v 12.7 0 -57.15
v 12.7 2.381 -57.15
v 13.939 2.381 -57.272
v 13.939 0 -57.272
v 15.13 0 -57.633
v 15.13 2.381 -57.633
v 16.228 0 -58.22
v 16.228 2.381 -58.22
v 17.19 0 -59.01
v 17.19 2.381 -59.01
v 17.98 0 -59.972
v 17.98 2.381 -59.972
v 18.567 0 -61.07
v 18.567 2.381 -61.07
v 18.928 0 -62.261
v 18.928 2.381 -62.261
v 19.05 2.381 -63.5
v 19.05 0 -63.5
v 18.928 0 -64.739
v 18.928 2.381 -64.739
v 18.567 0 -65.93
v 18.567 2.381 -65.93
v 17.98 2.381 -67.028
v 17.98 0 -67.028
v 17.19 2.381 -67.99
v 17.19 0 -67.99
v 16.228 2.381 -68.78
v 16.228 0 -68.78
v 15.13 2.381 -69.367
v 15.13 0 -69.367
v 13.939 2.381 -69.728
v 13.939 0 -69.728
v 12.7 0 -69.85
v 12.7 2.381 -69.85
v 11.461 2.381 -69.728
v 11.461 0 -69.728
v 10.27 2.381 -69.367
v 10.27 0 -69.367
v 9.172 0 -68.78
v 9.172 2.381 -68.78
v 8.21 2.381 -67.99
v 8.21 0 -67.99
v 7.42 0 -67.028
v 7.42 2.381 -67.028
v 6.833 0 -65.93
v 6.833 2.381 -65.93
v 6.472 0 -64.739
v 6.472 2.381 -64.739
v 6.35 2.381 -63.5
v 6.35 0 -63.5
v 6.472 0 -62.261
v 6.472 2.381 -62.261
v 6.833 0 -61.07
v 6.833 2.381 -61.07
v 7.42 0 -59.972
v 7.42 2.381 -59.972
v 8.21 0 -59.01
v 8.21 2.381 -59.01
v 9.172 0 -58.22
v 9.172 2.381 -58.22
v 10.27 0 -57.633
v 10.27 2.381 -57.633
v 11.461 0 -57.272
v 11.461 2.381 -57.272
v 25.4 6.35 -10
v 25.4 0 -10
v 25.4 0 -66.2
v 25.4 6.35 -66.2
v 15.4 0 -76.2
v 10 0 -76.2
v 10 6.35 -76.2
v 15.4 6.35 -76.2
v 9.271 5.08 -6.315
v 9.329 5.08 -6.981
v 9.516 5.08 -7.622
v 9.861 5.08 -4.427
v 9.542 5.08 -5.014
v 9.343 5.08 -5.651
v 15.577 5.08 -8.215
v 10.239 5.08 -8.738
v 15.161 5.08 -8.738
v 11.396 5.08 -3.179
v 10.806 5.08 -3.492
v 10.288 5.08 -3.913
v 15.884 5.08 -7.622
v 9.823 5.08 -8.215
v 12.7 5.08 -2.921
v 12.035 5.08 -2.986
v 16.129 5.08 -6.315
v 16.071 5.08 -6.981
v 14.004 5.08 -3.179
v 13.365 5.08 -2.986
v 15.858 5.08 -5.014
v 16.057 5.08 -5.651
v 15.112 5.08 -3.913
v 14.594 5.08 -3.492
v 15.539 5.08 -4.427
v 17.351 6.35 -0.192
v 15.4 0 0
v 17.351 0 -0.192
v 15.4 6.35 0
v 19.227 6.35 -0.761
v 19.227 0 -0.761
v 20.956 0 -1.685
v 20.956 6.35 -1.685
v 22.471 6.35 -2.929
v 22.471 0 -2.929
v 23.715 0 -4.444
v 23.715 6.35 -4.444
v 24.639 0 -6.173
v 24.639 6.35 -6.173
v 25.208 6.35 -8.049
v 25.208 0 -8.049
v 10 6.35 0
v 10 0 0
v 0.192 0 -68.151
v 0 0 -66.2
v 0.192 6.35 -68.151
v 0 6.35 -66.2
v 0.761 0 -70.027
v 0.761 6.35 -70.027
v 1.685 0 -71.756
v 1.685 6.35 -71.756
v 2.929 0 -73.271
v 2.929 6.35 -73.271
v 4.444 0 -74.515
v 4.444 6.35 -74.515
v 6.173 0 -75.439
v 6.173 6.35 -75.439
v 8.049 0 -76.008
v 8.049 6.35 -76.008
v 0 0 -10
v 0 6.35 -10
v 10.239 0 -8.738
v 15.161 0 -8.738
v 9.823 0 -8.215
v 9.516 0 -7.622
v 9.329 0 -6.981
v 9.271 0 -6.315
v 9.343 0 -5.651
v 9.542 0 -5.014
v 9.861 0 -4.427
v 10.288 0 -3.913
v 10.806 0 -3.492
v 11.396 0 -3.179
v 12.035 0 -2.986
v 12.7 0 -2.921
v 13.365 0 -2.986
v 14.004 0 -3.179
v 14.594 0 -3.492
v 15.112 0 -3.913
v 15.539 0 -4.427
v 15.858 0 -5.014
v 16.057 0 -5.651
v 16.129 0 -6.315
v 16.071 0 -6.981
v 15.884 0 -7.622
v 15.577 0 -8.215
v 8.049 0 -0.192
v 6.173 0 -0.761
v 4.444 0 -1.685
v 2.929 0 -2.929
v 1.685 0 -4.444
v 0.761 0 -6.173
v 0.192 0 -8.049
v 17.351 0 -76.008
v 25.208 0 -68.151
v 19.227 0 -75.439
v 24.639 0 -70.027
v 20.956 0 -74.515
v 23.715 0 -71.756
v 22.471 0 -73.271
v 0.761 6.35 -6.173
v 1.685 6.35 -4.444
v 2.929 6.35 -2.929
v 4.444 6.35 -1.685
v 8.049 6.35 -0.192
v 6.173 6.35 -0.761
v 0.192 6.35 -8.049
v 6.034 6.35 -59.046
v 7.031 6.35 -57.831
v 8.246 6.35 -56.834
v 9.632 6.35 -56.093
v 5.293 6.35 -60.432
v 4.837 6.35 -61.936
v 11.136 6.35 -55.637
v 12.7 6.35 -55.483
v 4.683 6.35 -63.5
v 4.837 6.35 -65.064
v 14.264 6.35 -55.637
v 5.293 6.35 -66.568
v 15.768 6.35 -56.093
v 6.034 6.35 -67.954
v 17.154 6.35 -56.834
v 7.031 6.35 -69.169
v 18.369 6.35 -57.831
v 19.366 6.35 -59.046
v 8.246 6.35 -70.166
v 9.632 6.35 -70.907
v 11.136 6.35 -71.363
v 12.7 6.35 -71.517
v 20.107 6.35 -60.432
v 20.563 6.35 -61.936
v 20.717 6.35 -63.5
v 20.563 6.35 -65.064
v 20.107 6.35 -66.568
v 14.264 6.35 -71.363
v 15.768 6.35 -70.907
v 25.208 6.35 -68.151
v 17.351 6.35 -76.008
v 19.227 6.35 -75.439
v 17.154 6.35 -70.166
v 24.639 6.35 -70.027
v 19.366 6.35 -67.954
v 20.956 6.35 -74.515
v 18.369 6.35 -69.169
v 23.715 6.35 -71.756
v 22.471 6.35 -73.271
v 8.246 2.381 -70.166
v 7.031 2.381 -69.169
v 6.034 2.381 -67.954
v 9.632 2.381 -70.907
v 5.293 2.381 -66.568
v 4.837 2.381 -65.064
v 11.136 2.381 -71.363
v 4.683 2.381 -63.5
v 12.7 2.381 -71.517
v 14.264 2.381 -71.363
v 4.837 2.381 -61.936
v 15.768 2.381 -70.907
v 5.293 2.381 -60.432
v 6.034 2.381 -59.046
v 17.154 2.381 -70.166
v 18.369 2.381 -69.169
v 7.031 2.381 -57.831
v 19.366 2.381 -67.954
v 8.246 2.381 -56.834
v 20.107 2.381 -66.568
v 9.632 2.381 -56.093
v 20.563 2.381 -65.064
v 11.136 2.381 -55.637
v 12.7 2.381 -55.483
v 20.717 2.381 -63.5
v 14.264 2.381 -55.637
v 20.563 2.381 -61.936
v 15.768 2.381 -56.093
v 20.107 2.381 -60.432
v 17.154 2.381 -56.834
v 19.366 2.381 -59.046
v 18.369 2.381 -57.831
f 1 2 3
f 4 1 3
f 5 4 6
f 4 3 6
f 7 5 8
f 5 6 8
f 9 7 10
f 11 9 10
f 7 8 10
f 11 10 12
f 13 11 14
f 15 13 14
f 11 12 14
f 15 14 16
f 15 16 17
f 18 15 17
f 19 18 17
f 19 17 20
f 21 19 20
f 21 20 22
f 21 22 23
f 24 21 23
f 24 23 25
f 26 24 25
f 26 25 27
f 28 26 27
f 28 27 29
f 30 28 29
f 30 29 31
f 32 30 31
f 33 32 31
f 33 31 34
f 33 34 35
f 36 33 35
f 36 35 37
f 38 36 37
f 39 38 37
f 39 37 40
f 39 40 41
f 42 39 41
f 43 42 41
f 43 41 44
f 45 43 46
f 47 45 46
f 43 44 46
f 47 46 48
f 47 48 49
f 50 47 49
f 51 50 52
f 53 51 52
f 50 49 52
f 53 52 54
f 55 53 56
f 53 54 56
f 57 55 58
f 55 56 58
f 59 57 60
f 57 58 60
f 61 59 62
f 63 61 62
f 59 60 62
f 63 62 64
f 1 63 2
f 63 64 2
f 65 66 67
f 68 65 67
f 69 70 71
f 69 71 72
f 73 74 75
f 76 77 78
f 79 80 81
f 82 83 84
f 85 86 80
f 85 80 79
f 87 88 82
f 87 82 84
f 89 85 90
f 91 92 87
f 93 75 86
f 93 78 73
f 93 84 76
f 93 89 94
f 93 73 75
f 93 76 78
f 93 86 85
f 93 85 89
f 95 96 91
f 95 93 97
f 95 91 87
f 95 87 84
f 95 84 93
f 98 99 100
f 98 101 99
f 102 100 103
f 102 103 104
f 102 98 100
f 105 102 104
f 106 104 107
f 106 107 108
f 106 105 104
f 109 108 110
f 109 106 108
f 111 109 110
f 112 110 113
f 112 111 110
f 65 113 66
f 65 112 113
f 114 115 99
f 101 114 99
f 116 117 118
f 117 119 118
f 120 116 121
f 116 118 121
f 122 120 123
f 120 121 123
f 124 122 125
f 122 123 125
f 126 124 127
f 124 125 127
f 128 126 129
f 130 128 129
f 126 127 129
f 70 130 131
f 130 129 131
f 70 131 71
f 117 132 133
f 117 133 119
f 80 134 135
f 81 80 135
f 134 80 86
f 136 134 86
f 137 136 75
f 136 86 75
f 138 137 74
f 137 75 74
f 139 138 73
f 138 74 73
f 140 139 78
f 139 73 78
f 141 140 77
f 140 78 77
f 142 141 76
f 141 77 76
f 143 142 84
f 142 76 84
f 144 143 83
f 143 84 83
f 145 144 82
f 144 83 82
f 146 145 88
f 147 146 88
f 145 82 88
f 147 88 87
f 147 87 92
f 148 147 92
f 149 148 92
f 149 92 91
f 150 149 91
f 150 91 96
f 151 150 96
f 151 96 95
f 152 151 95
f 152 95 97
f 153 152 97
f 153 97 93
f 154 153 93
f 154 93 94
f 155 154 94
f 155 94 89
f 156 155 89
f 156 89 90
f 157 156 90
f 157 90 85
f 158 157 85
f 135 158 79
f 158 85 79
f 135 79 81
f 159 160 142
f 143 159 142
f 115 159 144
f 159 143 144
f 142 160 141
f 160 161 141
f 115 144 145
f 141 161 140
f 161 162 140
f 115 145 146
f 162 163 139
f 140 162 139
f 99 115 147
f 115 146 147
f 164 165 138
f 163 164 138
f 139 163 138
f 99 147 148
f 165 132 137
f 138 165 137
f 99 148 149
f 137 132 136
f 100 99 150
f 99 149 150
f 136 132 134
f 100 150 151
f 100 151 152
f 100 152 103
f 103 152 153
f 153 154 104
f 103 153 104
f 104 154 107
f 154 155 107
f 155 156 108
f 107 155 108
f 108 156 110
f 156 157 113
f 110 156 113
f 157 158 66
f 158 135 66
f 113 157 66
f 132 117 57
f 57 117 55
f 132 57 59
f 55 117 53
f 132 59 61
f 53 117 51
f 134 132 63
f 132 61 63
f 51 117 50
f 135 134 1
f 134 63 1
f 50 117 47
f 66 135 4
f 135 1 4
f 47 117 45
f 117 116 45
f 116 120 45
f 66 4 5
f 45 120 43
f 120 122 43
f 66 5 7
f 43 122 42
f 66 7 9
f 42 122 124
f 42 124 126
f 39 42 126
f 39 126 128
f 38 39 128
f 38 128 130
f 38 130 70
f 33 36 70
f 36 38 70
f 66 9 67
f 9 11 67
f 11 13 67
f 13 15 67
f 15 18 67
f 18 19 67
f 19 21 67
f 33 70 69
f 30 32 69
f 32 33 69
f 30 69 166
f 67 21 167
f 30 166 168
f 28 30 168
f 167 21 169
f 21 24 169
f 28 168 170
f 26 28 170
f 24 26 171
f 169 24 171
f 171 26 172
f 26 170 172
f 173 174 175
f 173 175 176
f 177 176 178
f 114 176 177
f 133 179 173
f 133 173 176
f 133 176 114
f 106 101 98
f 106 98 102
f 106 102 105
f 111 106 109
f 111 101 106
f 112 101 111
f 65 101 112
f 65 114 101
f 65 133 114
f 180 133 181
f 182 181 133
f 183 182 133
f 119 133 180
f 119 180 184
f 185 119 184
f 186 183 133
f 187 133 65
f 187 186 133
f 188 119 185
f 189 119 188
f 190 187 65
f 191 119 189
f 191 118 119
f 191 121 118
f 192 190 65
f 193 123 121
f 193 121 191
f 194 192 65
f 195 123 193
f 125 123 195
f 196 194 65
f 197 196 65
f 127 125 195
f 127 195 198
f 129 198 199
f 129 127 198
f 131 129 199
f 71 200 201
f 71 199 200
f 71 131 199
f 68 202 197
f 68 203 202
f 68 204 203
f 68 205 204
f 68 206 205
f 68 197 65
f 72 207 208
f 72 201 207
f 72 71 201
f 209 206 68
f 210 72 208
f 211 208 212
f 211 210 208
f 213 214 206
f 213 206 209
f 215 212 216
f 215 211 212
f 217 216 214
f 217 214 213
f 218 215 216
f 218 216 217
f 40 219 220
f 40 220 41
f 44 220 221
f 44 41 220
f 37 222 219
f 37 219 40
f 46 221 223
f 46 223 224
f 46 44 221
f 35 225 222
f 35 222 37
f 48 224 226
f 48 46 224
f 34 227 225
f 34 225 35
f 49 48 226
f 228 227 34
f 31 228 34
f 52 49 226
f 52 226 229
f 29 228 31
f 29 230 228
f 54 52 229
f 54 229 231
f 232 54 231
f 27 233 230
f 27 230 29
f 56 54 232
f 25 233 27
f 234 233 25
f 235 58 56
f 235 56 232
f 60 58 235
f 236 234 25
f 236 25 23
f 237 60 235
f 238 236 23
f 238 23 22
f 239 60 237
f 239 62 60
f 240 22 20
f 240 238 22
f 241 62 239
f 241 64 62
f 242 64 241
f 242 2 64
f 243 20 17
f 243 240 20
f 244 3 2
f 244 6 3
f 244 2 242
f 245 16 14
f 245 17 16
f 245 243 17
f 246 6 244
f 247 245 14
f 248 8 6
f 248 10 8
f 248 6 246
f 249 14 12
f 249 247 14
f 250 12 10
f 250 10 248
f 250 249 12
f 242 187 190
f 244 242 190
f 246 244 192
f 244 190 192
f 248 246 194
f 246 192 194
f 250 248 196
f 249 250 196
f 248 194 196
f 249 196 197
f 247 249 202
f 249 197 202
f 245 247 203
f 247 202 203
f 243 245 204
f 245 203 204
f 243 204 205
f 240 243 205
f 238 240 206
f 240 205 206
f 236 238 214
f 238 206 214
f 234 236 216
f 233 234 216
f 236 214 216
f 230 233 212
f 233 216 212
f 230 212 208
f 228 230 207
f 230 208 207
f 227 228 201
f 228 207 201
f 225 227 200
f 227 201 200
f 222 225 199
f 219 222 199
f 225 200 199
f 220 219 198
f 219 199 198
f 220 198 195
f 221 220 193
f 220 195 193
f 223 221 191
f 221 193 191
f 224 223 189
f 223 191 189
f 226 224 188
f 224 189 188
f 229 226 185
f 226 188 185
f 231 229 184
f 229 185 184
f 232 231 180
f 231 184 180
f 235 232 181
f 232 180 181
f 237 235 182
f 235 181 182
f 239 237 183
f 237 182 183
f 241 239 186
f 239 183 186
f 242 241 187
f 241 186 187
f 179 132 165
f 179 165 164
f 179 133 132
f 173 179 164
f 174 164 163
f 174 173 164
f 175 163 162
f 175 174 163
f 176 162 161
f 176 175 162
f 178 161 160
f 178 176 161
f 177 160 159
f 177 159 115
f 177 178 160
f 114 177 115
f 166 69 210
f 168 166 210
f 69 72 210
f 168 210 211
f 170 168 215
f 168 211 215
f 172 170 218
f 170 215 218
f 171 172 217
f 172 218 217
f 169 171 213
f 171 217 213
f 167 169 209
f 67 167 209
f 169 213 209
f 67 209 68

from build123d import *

# Parameters (mm, degrees)
SKETCH1_W           = 25.4
SKETCH1_H           = 76.2
BOSS_EXTRUDE1_DEPTH = 6.35
SKETCH5_R           = 8.016875
CUT_EXTRUDE1_DEPTH  = 3.96875
SKETCH6_R           = 6.35
CUT_EXTRUDE2_DEPTH  = 81.419841933
SKETCH7_R           = 3.429
CUT_EXTRUDE3_DEPTH  = 7.62
SKETCH9_W           = 11.198432991
SKETCH9_H           = 1.819618823
BOSS_EXTRUDE2_DEPTH = 6.35
BOSS_EXTRUDE4_START = -6.35
SKETCH11_W          = 13.636513595
SKETCH11_H          = 8.31497605
BOSS_EXTRUDE4_DEPTH = 1.27
FILLET1_R           = 10


with BuildPart() as part:
    # Sketch1 → Boss-Extrude1 (new body)
    with BuildSketch(Plane(origin=(0, 0, 0), x_dir=(1, 0, 0), z_dir=(0, 1, 0))):
        with Locations((12.7, 38.1)):
            Rectangle(SKETCH1_W, SKETCH1_H)
    extrude(amount=BOSS_EXTRUDE1_DEPTH)

    # Sketch5 → Cut-Extrude1 (cut)
    with BuildSketch(Plane(origin=(0, 6.35, 0), x_dir=(1, 0, 0), z_dir=(0, 1, 0))):
        with Locations(Location((12.7, 63.5, 0), (0, 0, 270))):
            Circle(SKETCH5_R)
    extrude(amount=-CUT_EXTRUDE1_DEPTH, mode=Mode.SUBTRACT)

    # Sketch6 → Cut-Extrude2 (cut, through all)
    with BuildSketch(Plane(origin=(0, 2.38125, 0), x_dir=(1, 0, 0), z_dir=(0, 1, 0))):
        with Locations(Location((12.7, 63.5, 0), (0, 0, 270))):
            Circle(SKETCH6_R)
    extrude(amount=-CUT_EXTRUDE2_DEPTH, mode=Mode.SUBTRACT)

    # Sketch7 → Cut-Extrude3 (cut)
    with BuildSketch(Plane(origin=(0, 6.35, 0), x_dir=(1, 0, 0), z_dir=(0, 1, 0))):
        with Locations(Location((12.7, 6.35, 0), (0, 0, 270))):
            Circle(SKETCH7_R)
    extrude(amount=-CUT_EXTRUDE3_DEPTH, mode=Mode.SUBTRACT)

    # Sketch9 → Boss-Extrude2 (add, through all)
    with BuildSketch(Plane(origin=(0, 6.35, 0), x_dir=(1, 0, 0), z_dir=(0, 1, 0))):
        with Locations((12.325928429, 9.647409411)):
            Rectangle(SKETCH9_W, SKETCH9_H)
    extrude(amount=-BOSS_EXTRUDE2_DEPTH)

    # Sketch11 → Boss-Extrude4 (add)
    with BuildSketch(Plane.XZ.offset(BOSS_EXTRUDE4_START)):
        with Locations((12.44089651, -6.12924614)):
            Rectangle(SKETCH11_W, SKETCH11_H)
    extrude(amount=BOSS_EXTRUDE4_DEPTH)

    # Fillet1
    fillet1_edges = [part.edges().sort_by_distance(p)[0] for p in [
        (0, 3.175, -76.2),
        (25.4, 3.175, -76.2),
        (25.4, 3.175, 0),
        (0, 3.175, 0),
    ]]
    fillet(fillet1_edges, radius=FILLET1_R)


solid = part.part
